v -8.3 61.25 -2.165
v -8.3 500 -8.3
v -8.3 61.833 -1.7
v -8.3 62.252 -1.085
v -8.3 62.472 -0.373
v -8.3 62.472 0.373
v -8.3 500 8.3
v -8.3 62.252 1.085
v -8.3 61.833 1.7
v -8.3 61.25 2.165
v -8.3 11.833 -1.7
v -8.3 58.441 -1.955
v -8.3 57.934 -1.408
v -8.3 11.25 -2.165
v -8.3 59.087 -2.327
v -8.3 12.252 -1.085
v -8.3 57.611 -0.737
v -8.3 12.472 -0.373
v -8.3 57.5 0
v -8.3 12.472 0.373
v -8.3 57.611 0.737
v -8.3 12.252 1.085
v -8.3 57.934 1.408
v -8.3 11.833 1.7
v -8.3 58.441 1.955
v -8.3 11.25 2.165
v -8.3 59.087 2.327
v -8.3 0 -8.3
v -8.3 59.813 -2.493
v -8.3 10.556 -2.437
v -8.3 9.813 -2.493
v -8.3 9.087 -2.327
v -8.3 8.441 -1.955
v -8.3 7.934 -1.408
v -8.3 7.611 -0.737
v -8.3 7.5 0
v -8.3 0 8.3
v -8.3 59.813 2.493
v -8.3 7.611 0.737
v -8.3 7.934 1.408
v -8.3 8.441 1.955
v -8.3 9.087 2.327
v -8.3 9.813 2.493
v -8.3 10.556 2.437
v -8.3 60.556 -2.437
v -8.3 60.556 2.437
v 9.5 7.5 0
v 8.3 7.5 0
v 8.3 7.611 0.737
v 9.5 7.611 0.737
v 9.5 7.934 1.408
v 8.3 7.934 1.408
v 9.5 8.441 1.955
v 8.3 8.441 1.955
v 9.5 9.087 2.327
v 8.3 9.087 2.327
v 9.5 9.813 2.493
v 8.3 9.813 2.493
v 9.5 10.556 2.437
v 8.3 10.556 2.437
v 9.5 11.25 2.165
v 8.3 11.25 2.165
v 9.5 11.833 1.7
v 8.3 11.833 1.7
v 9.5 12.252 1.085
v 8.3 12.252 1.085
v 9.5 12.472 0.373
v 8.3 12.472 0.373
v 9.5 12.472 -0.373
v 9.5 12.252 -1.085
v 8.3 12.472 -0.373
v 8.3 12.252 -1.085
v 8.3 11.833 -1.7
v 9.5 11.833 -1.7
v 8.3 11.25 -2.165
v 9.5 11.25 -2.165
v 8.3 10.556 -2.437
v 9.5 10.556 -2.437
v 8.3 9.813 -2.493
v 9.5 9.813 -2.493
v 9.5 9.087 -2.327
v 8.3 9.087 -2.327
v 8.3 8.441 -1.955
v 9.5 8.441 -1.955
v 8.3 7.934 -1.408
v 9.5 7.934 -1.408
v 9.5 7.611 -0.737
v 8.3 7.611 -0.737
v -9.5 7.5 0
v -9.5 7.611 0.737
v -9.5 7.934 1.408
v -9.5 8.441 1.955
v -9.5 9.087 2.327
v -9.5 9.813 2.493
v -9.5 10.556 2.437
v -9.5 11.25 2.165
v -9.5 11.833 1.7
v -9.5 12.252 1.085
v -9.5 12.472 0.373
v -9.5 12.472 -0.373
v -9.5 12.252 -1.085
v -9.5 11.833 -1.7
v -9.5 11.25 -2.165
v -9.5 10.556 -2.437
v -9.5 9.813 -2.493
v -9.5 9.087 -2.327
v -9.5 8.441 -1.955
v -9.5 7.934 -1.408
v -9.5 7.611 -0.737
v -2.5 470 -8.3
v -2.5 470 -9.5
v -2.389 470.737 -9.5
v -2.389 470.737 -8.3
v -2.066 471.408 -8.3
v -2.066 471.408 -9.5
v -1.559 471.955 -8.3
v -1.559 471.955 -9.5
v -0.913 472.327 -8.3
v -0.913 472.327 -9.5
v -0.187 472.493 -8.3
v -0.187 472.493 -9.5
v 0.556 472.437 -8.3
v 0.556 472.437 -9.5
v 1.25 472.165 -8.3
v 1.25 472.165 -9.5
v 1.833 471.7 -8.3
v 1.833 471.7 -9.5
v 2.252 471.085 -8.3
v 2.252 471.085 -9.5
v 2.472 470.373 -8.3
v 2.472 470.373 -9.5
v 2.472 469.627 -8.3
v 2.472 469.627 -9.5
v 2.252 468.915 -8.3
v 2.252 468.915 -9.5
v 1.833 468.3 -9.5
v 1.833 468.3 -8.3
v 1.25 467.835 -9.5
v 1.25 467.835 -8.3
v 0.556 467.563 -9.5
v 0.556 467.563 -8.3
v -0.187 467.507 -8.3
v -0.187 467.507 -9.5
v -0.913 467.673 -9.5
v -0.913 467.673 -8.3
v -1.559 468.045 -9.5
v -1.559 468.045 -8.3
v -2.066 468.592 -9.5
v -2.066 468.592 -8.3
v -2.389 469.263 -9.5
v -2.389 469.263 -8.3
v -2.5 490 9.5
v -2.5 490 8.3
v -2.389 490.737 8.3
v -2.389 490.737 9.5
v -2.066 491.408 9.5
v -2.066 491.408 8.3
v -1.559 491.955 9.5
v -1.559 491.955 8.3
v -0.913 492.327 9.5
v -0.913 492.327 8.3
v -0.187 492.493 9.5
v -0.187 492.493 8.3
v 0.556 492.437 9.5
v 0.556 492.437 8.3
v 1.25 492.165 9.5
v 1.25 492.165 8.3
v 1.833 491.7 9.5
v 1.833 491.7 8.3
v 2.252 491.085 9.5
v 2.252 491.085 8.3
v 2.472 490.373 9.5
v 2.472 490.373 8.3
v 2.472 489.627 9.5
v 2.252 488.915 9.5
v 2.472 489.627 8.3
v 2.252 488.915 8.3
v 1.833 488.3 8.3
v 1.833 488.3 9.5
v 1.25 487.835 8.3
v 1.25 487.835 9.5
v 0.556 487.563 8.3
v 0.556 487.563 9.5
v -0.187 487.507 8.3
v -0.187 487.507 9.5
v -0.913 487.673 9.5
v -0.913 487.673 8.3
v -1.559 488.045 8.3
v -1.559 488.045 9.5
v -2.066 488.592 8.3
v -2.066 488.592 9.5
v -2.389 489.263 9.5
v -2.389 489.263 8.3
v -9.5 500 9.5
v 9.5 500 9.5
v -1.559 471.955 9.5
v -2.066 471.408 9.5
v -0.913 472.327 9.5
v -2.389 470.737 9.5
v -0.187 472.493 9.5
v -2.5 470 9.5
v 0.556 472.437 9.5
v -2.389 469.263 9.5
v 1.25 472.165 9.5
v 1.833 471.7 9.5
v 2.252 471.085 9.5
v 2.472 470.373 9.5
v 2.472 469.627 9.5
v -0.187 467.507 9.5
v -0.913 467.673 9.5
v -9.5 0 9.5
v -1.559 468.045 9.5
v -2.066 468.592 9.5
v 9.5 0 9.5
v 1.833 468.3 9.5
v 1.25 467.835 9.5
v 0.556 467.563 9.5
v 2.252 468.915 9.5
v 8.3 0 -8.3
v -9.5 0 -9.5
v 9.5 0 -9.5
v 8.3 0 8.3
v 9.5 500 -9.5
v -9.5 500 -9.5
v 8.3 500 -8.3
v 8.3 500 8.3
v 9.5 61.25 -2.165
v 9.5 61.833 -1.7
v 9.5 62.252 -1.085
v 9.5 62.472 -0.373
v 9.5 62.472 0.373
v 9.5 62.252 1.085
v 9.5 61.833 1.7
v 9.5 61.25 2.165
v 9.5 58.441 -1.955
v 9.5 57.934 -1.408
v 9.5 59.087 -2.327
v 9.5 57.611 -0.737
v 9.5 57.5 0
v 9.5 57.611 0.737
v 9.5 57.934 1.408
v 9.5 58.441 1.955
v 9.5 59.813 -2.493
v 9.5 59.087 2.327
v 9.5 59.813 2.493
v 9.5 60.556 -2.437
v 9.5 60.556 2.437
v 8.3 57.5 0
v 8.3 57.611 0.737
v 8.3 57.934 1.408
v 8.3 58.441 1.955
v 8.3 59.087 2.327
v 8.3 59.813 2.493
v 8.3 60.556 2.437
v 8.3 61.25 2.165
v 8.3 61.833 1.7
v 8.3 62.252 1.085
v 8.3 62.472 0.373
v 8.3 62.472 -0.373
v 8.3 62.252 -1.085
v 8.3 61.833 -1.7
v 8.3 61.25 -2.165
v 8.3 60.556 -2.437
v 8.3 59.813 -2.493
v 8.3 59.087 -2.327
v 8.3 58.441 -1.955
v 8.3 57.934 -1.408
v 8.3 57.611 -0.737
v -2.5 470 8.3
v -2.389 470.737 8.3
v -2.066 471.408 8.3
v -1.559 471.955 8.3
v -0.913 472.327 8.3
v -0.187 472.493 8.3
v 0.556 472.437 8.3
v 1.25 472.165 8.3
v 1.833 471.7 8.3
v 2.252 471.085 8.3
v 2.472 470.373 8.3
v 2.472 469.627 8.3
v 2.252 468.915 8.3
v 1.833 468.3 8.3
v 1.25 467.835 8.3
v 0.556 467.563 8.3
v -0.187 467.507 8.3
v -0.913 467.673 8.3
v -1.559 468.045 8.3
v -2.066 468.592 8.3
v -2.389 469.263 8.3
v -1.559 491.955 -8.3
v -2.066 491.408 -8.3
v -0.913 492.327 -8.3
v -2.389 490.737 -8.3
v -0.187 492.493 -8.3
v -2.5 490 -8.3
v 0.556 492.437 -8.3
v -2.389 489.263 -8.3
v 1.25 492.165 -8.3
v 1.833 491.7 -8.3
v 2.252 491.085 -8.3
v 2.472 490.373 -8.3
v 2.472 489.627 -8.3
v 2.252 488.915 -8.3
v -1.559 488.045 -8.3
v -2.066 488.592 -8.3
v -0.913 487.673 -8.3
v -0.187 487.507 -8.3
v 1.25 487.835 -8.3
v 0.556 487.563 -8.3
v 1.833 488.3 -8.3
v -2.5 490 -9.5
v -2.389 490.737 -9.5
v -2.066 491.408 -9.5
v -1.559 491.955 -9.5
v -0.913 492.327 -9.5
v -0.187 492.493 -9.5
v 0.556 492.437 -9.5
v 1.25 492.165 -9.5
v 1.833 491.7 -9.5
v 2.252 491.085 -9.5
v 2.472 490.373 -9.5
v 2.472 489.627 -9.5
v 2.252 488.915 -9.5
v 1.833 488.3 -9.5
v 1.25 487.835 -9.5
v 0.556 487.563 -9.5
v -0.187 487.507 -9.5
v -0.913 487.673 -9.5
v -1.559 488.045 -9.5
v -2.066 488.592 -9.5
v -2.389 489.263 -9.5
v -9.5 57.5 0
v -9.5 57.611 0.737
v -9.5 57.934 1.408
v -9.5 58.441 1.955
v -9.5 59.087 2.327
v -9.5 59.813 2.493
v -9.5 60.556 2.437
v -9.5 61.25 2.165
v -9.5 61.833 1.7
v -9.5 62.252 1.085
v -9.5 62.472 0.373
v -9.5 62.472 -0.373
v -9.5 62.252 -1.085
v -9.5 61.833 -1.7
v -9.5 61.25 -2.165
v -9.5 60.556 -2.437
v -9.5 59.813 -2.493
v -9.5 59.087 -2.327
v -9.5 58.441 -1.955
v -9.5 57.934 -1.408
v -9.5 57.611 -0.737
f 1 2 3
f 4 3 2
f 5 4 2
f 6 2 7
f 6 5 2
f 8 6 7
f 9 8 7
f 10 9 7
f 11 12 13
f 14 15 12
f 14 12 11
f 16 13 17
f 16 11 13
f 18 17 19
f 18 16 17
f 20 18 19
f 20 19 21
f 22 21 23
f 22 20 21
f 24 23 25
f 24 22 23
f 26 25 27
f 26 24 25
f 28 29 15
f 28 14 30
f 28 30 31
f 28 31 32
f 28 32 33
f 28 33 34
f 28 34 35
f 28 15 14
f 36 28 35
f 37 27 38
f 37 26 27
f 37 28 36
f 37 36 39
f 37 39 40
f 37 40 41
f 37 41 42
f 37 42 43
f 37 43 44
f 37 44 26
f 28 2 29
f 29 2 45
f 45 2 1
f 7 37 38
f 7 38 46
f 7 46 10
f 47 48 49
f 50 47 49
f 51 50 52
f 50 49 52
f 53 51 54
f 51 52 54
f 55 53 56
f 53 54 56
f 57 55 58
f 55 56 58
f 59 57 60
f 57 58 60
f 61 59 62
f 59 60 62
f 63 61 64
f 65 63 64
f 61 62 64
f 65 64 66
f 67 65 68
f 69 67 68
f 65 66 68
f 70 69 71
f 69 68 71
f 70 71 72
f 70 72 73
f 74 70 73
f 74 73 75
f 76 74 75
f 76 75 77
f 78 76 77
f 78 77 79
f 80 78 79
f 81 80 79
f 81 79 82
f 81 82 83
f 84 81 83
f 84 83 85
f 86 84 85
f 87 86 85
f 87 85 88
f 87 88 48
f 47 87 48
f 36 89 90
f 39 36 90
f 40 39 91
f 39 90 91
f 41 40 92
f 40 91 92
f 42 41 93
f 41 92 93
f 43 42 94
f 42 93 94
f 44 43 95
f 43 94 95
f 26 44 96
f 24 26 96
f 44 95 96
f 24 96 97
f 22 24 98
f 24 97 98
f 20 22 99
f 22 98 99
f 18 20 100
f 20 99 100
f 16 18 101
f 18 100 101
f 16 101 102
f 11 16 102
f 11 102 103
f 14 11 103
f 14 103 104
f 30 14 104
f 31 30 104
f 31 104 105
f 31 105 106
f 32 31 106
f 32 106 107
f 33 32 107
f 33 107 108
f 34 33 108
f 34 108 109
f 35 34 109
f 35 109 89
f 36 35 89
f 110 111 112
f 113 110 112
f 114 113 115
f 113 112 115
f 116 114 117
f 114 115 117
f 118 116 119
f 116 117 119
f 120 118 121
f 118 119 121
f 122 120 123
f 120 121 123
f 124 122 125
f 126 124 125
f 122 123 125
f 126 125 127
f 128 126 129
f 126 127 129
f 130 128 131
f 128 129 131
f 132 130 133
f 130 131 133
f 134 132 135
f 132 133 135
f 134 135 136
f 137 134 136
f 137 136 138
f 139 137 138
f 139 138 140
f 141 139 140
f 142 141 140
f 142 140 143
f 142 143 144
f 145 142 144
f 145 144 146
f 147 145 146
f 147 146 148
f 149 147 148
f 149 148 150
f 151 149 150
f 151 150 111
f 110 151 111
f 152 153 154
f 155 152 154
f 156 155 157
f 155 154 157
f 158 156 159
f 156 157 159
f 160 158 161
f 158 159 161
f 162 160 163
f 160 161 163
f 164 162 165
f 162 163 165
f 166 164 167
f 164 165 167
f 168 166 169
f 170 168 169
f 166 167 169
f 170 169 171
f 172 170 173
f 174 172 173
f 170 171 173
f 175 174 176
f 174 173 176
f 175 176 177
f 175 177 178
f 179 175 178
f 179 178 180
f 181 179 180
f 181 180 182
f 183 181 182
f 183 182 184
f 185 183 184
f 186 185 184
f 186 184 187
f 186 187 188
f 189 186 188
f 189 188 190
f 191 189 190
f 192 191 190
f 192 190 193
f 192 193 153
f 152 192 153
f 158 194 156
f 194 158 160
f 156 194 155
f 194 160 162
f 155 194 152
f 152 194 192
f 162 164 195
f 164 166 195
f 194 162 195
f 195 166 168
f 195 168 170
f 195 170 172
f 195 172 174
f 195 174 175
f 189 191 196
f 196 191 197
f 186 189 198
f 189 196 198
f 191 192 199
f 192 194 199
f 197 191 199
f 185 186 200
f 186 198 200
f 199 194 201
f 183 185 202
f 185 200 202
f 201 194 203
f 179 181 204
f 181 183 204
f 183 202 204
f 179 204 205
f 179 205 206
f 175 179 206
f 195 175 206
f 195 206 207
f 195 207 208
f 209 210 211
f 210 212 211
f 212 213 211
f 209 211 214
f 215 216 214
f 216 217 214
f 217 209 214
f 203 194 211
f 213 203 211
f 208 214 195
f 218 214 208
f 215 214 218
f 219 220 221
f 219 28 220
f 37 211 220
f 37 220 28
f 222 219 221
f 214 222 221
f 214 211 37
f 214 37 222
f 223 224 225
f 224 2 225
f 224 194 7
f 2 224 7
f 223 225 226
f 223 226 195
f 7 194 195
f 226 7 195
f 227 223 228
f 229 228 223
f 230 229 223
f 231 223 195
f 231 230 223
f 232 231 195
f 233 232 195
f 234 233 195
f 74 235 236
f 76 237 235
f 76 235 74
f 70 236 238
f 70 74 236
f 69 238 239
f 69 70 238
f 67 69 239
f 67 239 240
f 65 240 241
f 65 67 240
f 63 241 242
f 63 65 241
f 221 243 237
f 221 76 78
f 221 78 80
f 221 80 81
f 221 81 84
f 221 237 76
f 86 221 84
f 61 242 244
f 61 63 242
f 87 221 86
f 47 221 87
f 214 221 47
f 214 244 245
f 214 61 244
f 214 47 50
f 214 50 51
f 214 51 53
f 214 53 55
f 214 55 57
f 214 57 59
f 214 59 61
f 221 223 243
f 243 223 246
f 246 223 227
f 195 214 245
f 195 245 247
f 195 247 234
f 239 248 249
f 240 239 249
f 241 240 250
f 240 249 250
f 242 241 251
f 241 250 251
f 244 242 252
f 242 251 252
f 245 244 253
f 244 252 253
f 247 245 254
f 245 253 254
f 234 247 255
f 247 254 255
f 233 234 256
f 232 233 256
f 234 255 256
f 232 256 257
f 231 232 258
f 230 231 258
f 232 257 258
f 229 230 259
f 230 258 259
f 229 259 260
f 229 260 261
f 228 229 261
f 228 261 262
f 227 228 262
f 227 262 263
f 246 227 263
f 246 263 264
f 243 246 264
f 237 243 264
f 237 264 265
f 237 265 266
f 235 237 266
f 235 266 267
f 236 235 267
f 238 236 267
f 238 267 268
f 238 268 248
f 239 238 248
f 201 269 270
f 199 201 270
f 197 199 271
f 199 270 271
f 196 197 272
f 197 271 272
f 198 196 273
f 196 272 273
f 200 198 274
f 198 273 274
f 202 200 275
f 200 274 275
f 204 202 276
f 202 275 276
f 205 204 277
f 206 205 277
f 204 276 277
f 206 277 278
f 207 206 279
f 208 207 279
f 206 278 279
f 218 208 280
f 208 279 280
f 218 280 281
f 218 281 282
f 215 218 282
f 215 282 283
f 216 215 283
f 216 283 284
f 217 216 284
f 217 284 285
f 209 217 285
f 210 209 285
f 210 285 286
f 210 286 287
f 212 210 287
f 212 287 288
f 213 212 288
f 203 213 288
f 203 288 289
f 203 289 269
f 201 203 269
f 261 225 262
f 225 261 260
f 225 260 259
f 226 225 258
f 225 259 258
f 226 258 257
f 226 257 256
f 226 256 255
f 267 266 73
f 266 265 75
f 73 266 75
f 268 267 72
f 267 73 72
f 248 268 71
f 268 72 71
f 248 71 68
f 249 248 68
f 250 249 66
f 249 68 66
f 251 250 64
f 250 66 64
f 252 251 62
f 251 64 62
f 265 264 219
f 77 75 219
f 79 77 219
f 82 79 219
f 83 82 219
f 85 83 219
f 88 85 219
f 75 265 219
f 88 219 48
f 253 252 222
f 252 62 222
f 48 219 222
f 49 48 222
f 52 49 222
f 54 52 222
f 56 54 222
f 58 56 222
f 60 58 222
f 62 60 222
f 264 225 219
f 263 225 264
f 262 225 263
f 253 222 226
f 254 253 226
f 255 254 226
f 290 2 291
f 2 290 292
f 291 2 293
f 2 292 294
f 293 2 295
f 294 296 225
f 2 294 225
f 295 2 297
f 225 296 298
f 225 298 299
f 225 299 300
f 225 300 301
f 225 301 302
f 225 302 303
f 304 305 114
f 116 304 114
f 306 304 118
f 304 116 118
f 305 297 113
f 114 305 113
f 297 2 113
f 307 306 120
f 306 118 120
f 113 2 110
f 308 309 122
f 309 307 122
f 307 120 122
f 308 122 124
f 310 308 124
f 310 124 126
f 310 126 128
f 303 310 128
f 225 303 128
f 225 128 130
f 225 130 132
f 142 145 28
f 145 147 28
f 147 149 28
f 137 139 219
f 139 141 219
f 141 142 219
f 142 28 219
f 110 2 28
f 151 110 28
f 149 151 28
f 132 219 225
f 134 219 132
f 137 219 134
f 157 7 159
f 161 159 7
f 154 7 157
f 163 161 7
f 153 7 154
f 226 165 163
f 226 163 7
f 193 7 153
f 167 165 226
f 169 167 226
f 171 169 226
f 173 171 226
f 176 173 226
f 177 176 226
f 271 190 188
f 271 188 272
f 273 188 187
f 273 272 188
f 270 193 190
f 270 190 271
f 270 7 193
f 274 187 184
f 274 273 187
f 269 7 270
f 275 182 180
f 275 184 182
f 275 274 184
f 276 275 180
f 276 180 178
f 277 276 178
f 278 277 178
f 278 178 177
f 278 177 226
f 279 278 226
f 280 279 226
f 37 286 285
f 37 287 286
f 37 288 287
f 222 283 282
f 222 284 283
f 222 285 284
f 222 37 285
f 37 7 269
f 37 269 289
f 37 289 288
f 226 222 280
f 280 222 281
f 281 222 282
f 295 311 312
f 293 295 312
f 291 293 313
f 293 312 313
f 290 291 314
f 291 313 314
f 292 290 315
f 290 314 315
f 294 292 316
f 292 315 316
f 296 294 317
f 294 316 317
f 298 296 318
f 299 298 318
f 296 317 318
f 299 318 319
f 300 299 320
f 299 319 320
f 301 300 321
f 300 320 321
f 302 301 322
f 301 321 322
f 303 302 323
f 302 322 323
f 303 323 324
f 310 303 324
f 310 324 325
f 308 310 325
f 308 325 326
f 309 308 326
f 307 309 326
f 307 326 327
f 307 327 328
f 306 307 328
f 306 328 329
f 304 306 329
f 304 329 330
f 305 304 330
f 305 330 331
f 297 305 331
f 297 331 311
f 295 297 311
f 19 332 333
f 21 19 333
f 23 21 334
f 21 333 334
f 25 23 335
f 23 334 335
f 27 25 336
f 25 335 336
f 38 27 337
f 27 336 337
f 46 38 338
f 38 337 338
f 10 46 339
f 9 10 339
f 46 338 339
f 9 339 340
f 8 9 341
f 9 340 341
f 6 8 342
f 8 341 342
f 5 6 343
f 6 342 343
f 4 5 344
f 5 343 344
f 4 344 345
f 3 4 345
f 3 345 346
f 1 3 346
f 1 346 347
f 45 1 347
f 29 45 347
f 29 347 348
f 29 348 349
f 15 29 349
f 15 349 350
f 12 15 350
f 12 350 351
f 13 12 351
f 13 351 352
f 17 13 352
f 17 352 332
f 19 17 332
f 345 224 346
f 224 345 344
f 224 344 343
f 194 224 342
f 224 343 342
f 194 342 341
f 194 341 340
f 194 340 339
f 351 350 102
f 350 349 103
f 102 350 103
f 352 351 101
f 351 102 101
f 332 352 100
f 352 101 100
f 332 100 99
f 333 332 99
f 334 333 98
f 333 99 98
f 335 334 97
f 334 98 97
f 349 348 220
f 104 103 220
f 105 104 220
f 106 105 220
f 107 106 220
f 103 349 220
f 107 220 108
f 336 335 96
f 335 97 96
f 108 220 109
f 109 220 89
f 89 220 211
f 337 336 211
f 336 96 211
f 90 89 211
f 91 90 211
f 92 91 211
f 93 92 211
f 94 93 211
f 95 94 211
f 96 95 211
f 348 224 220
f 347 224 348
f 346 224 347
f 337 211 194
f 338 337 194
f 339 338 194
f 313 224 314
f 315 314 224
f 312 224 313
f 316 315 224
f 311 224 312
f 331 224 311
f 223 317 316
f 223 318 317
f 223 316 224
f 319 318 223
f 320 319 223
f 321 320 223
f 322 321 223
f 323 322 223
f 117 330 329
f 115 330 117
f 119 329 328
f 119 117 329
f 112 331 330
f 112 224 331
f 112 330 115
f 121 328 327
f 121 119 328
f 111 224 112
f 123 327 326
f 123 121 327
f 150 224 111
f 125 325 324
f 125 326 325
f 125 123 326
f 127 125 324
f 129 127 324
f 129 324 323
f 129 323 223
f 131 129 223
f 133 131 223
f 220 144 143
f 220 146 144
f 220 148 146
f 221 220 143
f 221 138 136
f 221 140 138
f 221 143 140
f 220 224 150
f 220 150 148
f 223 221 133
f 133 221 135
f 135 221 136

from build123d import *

# Parameters (mm, degrees)
F1_W     = 19
F1_H     = 19
F1_W_2   = 16.6
F1_H_2   = 16.6
F2_DEPTH = 500
F4_D     = 5
F6_D     = 5


with BuildPart() as f2:
    # F1 (on Front) → F2 (new body)
    with BuildSketch(Plane.XZ):
        Rectangle(F1_W, F1_H)
        Rectangle(F1_W_2, F1_H_2, mode=Mode.SUBTRACT)
    extrude(amount=-F2_DEPTH)

    # F4 (through all)
    with Locations(Plane.XY.offset(9.5)):
        with Locations((0, 490), (0, 470)):
            Hole(F4_D / 2)

    # F6 (through all)
    with Locations(Plane.YZ.offset(9.5)):
        with Locations((10, 0), (60, 0)):
            Hole(F6_D / 2)


solid = f2.part
